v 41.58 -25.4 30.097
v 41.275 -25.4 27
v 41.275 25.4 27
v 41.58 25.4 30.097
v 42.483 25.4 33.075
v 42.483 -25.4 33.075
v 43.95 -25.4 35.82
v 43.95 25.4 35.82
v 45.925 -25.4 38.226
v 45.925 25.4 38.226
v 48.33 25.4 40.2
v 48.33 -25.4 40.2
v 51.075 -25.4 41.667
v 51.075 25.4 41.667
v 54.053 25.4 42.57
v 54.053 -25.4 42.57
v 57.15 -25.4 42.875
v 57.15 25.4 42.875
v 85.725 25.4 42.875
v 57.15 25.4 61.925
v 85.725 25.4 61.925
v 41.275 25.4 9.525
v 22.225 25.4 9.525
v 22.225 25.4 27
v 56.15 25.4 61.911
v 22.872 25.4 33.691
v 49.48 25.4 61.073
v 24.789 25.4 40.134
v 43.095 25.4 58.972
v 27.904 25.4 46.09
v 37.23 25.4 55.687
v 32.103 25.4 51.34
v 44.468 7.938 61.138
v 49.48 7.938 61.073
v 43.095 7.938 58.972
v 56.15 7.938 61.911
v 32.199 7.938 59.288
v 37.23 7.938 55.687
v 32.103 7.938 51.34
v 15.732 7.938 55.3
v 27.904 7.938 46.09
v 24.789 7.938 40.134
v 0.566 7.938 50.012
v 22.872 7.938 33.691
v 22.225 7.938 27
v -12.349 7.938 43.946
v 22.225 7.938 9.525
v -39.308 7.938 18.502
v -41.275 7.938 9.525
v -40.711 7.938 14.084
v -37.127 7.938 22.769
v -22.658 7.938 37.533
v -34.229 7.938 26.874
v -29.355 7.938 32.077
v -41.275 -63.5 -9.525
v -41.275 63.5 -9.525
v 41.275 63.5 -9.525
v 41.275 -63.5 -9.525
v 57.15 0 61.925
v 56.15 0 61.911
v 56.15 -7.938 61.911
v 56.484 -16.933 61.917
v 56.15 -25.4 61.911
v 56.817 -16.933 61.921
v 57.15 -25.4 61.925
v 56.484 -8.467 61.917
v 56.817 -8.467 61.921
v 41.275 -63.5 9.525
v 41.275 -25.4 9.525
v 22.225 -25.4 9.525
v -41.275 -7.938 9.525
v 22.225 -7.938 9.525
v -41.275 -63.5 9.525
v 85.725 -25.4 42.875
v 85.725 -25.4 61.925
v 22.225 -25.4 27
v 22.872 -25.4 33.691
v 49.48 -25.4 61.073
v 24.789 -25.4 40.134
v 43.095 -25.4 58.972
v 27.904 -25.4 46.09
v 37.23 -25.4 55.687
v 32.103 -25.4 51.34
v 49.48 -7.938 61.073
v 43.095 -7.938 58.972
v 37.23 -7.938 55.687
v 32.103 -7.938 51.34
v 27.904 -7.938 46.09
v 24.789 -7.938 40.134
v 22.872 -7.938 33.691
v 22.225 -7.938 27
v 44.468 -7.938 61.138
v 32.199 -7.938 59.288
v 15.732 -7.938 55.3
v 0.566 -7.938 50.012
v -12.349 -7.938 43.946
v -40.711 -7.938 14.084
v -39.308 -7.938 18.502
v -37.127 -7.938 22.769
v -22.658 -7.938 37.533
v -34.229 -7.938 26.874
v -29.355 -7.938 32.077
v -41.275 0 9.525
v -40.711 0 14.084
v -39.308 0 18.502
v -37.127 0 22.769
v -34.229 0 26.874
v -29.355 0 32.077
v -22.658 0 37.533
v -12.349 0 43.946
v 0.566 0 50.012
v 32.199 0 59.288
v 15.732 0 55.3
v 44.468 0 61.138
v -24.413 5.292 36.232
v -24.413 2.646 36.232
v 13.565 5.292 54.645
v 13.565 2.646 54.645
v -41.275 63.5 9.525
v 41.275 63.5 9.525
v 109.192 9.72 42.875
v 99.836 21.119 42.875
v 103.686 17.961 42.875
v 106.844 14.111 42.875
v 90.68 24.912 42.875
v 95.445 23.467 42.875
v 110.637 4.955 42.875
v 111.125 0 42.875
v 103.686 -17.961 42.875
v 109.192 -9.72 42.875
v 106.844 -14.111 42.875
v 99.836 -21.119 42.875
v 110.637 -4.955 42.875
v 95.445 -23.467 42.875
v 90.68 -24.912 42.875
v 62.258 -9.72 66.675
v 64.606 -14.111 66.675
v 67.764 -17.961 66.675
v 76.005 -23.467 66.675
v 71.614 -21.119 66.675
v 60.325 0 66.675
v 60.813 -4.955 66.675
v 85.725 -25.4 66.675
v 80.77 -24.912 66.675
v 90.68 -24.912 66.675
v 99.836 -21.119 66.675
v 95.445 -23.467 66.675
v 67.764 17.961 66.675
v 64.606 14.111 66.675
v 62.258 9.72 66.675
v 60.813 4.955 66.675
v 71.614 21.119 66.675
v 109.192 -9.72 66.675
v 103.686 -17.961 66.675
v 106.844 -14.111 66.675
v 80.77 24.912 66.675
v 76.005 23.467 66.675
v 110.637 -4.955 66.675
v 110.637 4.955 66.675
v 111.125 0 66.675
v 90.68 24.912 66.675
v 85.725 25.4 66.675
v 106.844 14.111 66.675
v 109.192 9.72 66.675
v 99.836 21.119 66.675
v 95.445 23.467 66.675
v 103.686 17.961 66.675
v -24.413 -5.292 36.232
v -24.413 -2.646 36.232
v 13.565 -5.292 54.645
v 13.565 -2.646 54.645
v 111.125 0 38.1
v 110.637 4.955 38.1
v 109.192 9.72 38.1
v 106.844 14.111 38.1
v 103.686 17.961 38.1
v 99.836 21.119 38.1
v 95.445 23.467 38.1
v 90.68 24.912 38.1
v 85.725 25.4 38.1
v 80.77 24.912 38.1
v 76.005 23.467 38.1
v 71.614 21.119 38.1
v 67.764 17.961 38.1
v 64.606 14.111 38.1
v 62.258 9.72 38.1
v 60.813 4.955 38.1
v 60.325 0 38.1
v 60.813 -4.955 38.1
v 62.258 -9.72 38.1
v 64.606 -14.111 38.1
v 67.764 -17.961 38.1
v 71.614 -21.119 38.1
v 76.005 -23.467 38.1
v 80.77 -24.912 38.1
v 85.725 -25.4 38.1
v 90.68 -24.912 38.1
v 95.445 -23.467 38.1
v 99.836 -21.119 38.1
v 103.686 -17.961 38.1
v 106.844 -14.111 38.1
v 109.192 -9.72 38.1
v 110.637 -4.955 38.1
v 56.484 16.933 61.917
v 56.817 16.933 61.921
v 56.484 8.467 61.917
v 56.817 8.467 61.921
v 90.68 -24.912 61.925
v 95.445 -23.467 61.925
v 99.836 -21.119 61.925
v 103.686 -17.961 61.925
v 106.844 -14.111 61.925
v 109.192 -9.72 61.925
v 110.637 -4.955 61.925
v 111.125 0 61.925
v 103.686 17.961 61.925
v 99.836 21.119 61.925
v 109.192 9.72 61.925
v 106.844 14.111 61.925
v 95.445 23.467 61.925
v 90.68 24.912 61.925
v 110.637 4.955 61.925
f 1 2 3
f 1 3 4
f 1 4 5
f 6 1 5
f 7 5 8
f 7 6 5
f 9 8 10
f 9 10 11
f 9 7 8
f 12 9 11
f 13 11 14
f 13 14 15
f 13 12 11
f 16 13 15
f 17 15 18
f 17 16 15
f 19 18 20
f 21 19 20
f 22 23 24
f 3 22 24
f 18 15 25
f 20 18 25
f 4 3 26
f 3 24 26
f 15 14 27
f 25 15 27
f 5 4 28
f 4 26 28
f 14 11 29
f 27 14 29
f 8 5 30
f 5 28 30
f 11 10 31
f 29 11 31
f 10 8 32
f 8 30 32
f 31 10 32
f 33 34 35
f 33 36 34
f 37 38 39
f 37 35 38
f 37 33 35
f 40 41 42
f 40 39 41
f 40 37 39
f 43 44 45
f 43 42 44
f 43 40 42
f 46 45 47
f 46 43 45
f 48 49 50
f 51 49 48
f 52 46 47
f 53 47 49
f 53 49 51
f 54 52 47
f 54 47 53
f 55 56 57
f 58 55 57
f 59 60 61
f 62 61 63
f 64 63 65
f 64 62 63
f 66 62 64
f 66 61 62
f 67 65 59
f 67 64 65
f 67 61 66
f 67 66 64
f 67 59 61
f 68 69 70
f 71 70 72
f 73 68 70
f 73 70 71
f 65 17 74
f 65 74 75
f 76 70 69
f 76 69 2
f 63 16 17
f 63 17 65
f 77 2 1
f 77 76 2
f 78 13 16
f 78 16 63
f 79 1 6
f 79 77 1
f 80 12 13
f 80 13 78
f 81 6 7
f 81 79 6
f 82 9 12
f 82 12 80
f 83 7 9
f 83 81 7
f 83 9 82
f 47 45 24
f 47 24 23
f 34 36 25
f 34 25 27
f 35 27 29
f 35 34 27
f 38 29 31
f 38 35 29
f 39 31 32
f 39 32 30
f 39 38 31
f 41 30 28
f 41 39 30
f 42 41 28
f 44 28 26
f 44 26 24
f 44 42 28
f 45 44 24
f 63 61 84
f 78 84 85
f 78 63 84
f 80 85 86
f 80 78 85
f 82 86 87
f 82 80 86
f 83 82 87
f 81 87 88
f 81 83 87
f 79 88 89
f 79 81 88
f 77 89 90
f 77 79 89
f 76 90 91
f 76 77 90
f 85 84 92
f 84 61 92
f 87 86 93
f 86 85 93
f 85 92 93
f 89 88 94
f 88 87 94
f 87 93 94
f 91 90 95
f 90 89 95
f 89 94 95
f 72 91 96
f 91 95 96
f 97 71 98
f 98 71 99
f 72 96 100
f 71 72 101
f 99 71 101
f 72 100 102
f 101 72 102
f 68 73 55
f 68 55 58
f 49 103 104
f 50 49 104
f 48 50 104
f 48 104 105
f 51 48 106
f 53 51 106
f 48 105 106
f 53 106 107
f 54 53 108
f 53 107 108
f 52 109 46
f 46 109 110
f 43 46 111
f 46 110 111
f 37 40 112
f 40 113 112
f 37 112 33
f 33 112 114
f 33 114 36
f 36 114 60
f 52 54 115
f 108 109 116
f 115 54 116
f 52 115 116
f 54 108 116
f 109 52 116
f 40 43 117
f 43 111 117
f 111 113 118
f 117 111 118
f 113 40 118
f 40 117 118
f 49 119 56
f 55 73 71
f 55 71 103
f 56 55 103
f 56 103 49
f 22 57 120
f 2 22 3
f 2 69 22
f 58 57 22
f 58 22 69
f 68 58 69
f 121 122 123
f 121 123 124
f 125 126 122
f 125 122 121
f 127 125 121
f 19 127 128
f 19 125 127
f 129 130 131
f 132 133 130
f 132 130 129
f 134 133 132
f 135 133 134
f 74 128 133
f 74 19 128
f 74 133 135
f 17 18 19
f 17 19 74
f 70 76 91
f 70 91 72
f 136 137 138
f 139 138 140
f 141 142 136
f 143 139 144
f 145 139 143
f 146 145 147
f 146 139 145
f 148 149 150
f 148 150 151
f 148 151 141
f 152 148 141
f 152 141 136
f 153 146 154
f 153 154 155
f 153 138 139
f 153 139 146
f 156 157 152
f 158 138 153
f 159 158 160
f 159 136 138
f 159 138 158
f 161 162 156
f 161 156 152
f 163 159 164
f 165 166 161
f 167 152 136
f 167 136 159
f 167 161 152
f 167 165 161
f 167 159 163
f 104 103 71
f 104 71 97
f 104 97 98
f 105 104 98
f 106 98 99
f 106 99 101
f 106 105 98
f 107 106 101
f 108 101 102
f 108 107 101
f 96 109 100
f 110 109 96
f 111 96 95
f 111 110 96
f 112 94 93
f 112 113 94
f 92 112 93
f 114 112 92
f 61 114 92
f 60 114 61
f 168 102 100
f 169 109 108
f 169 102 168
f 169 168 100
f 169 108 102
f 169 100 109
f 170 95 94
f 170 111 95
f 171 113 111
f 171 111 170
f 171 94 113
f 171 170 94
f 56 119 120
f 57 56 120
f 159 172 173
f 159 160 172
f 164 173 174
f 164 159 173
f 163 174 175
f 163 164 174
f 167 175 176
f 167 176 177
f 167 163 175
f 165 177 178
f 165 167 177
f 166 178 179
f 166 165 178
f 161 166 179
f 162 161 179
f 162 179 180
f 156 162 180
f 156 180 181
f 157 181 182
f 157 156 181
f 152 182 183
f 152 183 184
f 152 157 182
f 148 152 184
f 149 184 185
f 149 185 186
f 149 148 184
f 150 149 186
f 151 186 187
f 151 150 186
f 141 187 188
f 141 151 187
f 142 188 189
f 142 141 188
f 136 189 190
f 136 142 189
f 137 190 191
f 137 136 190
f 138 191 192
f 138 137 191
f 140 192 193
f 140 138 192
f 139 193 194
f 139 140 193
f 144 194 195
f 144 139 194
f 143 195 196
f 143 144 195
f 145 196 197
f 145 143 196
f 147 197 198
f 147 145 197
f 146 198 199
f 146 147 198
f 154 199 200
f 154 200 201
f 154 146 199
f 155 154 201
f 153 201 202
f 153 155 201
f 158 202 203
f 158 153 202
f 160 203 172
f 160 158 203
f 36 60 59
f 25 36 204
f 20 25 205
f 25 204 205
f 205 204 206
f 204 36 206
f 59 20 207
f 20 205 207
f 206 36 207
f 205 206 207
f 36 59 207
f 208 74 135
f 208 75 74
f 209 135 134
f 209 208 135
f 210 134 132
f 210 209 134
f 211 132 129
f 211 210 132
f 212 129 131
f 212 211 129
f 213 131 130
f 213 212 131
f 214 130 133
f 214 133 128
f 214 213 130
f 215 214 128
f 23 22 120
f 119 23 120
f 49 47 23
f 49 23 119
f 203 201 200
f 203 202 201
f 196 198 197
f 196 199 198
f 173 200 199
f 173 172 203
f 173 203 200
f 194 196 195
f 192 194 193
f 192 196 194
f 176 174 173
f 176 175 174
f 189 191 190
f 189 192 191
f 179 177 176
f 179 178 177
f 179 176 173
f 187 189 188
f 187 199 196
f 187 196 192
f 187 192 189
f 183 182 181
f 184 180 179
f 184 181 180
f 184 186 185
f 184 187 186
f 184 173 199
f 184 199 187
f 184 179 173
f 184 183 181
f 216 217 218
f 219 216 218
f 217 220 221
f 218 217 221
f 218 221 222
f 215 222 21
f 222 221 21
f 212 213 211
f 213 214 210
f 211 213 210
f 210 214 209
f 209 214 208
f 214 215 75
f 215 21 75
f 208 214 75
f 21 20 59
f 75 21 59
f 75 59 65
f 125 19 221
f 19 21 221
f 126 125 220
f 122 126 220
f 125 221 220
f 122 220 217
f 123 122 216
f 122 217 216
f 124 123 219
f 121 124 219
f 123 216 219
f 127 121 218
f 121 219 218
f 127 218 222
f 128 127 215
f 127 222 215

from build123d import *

# Parameters (mm, degrees)
F1_DEPTH = 63.5
F2_DEPTH = 25.4
F3_DEPTH = 7.9375
F4_DEPTH = 50.8
F6_R     = 25.39999


# Not quite as in the source:
# - a fillet or chamfer is up to 0.001 mm smaller than in the source, because OpenCascade refuses the exact size


with BuildPart() as f1:
    # F0 (on Front) → F1 (new body, symmetric)
    with BuildSketch(Plane.XZ):
        Polygon((-41.275, 9.525), (-41.275, -9.525), (41.275, -9.525), (41.275, 9.525), (22.225, 9.525), align=None)
    extrude(amount=F1_DEPTH, both=True)

    # F0 (on Front) → F2 (join, symmetric)
    with BuildSketch(Plane.XZ):
        with BuildLine():
            Line((22.225, 9.525), (41.275, 9.525))
            Line((41.275, 9.525), (41.275, 27.0002))
            ThreePointArc((41.275, 27.0002), (45.9246798487, 38.2255201513), (57.15, 42.8752))
            Line((57.15, 42.8752), (60.325, 42.8752))
            Line((60.325, 42.8752), (60.325, 61.9252))
            Line((60.325, 61.9252), (57.15, 61.9252))
            add(Edge.make_bspline(
                [(56.1497156539, 61.9108725261), (56.4844485329, 61.9171678859), (56.8178918504, 61.9219463376), (57.15, 61.9252)],
                knots=[110.5648551898, 110.5648551898, 110.5648551898, 110.5648551898, 111.5045361635, 111.5045361635, 111.5045361635, 111.5045361635], degree=3))
            ThreePointArc((56.1497156539, 61.9108725261), (32.1031383624, 51.3396812415), (22.225, 27.0002))
            Line((22.225, 27.0002), (22.225, 9.525))
        make_face()
    extrude(amount=F2_DEPTH, both=True)

    # F0 (on Front) → F3 (join, symmetric)
    with BuildSketch(Plane.XZ):
        with BuildLine():
            add(Edge.make_bspline(
                [(-41.275, 9.525), (-40.4742170634, 39.4287788878), (16.7643355785, 61.1701471538), (56.1497156539, 61.9108725261)],
                knots=[0, 0, 0, 0, 110.5648551898, 110.5648551898, 110.5648551898, 110.5648551898], degree=3))
            Line((-41.275, 9.525), (22.225, 9.525))
            Line((22.225, 9.525), (22.225, 27.0002))
            ThreePointArc((22.225, 27.0002), (32.1031383624, 51.3396812415), (56.1497156539, 61.9108725261))
        make_face()
    extrude(amount=F3_DEPTH, both=True)

    # F4 (add): a face of the model
    f4_faces = [f1.faces().sort_by_distance(p)[0] for p in [
        (60.325, 0, 52.4002),
    ]]
    extrude(f4_faces, amount=F4_DEPTH)

    # F6 (radius 25.4 in the source; OpenCascade refuses exactly that, so slightly less here)
    f6_edges = [f1.edges().sort_by_distance(p)[0] for p in [
        (111.125, -25.4, 52.4002),
        (111.125, 25.4, 52.4002),
    ]]
    fillet(f6_edges, radius=F6_R)


with BuildPart() as f5:
    # F0 (on Front) → F5 (revolve)
    with BuildSketch(Plane.XZ):
        Polygon((85.725, 66.675), (85.725, 61.9252), (85.725, 42.8752), (85.725, 38.1), (111.125, 38.1), (111.125, 66.675), align=None)
    revolve(axis=Axis((85.725, 0, 52.3875), (0, 0, 1)))


solid = Compound([f1.part, f5.part])
